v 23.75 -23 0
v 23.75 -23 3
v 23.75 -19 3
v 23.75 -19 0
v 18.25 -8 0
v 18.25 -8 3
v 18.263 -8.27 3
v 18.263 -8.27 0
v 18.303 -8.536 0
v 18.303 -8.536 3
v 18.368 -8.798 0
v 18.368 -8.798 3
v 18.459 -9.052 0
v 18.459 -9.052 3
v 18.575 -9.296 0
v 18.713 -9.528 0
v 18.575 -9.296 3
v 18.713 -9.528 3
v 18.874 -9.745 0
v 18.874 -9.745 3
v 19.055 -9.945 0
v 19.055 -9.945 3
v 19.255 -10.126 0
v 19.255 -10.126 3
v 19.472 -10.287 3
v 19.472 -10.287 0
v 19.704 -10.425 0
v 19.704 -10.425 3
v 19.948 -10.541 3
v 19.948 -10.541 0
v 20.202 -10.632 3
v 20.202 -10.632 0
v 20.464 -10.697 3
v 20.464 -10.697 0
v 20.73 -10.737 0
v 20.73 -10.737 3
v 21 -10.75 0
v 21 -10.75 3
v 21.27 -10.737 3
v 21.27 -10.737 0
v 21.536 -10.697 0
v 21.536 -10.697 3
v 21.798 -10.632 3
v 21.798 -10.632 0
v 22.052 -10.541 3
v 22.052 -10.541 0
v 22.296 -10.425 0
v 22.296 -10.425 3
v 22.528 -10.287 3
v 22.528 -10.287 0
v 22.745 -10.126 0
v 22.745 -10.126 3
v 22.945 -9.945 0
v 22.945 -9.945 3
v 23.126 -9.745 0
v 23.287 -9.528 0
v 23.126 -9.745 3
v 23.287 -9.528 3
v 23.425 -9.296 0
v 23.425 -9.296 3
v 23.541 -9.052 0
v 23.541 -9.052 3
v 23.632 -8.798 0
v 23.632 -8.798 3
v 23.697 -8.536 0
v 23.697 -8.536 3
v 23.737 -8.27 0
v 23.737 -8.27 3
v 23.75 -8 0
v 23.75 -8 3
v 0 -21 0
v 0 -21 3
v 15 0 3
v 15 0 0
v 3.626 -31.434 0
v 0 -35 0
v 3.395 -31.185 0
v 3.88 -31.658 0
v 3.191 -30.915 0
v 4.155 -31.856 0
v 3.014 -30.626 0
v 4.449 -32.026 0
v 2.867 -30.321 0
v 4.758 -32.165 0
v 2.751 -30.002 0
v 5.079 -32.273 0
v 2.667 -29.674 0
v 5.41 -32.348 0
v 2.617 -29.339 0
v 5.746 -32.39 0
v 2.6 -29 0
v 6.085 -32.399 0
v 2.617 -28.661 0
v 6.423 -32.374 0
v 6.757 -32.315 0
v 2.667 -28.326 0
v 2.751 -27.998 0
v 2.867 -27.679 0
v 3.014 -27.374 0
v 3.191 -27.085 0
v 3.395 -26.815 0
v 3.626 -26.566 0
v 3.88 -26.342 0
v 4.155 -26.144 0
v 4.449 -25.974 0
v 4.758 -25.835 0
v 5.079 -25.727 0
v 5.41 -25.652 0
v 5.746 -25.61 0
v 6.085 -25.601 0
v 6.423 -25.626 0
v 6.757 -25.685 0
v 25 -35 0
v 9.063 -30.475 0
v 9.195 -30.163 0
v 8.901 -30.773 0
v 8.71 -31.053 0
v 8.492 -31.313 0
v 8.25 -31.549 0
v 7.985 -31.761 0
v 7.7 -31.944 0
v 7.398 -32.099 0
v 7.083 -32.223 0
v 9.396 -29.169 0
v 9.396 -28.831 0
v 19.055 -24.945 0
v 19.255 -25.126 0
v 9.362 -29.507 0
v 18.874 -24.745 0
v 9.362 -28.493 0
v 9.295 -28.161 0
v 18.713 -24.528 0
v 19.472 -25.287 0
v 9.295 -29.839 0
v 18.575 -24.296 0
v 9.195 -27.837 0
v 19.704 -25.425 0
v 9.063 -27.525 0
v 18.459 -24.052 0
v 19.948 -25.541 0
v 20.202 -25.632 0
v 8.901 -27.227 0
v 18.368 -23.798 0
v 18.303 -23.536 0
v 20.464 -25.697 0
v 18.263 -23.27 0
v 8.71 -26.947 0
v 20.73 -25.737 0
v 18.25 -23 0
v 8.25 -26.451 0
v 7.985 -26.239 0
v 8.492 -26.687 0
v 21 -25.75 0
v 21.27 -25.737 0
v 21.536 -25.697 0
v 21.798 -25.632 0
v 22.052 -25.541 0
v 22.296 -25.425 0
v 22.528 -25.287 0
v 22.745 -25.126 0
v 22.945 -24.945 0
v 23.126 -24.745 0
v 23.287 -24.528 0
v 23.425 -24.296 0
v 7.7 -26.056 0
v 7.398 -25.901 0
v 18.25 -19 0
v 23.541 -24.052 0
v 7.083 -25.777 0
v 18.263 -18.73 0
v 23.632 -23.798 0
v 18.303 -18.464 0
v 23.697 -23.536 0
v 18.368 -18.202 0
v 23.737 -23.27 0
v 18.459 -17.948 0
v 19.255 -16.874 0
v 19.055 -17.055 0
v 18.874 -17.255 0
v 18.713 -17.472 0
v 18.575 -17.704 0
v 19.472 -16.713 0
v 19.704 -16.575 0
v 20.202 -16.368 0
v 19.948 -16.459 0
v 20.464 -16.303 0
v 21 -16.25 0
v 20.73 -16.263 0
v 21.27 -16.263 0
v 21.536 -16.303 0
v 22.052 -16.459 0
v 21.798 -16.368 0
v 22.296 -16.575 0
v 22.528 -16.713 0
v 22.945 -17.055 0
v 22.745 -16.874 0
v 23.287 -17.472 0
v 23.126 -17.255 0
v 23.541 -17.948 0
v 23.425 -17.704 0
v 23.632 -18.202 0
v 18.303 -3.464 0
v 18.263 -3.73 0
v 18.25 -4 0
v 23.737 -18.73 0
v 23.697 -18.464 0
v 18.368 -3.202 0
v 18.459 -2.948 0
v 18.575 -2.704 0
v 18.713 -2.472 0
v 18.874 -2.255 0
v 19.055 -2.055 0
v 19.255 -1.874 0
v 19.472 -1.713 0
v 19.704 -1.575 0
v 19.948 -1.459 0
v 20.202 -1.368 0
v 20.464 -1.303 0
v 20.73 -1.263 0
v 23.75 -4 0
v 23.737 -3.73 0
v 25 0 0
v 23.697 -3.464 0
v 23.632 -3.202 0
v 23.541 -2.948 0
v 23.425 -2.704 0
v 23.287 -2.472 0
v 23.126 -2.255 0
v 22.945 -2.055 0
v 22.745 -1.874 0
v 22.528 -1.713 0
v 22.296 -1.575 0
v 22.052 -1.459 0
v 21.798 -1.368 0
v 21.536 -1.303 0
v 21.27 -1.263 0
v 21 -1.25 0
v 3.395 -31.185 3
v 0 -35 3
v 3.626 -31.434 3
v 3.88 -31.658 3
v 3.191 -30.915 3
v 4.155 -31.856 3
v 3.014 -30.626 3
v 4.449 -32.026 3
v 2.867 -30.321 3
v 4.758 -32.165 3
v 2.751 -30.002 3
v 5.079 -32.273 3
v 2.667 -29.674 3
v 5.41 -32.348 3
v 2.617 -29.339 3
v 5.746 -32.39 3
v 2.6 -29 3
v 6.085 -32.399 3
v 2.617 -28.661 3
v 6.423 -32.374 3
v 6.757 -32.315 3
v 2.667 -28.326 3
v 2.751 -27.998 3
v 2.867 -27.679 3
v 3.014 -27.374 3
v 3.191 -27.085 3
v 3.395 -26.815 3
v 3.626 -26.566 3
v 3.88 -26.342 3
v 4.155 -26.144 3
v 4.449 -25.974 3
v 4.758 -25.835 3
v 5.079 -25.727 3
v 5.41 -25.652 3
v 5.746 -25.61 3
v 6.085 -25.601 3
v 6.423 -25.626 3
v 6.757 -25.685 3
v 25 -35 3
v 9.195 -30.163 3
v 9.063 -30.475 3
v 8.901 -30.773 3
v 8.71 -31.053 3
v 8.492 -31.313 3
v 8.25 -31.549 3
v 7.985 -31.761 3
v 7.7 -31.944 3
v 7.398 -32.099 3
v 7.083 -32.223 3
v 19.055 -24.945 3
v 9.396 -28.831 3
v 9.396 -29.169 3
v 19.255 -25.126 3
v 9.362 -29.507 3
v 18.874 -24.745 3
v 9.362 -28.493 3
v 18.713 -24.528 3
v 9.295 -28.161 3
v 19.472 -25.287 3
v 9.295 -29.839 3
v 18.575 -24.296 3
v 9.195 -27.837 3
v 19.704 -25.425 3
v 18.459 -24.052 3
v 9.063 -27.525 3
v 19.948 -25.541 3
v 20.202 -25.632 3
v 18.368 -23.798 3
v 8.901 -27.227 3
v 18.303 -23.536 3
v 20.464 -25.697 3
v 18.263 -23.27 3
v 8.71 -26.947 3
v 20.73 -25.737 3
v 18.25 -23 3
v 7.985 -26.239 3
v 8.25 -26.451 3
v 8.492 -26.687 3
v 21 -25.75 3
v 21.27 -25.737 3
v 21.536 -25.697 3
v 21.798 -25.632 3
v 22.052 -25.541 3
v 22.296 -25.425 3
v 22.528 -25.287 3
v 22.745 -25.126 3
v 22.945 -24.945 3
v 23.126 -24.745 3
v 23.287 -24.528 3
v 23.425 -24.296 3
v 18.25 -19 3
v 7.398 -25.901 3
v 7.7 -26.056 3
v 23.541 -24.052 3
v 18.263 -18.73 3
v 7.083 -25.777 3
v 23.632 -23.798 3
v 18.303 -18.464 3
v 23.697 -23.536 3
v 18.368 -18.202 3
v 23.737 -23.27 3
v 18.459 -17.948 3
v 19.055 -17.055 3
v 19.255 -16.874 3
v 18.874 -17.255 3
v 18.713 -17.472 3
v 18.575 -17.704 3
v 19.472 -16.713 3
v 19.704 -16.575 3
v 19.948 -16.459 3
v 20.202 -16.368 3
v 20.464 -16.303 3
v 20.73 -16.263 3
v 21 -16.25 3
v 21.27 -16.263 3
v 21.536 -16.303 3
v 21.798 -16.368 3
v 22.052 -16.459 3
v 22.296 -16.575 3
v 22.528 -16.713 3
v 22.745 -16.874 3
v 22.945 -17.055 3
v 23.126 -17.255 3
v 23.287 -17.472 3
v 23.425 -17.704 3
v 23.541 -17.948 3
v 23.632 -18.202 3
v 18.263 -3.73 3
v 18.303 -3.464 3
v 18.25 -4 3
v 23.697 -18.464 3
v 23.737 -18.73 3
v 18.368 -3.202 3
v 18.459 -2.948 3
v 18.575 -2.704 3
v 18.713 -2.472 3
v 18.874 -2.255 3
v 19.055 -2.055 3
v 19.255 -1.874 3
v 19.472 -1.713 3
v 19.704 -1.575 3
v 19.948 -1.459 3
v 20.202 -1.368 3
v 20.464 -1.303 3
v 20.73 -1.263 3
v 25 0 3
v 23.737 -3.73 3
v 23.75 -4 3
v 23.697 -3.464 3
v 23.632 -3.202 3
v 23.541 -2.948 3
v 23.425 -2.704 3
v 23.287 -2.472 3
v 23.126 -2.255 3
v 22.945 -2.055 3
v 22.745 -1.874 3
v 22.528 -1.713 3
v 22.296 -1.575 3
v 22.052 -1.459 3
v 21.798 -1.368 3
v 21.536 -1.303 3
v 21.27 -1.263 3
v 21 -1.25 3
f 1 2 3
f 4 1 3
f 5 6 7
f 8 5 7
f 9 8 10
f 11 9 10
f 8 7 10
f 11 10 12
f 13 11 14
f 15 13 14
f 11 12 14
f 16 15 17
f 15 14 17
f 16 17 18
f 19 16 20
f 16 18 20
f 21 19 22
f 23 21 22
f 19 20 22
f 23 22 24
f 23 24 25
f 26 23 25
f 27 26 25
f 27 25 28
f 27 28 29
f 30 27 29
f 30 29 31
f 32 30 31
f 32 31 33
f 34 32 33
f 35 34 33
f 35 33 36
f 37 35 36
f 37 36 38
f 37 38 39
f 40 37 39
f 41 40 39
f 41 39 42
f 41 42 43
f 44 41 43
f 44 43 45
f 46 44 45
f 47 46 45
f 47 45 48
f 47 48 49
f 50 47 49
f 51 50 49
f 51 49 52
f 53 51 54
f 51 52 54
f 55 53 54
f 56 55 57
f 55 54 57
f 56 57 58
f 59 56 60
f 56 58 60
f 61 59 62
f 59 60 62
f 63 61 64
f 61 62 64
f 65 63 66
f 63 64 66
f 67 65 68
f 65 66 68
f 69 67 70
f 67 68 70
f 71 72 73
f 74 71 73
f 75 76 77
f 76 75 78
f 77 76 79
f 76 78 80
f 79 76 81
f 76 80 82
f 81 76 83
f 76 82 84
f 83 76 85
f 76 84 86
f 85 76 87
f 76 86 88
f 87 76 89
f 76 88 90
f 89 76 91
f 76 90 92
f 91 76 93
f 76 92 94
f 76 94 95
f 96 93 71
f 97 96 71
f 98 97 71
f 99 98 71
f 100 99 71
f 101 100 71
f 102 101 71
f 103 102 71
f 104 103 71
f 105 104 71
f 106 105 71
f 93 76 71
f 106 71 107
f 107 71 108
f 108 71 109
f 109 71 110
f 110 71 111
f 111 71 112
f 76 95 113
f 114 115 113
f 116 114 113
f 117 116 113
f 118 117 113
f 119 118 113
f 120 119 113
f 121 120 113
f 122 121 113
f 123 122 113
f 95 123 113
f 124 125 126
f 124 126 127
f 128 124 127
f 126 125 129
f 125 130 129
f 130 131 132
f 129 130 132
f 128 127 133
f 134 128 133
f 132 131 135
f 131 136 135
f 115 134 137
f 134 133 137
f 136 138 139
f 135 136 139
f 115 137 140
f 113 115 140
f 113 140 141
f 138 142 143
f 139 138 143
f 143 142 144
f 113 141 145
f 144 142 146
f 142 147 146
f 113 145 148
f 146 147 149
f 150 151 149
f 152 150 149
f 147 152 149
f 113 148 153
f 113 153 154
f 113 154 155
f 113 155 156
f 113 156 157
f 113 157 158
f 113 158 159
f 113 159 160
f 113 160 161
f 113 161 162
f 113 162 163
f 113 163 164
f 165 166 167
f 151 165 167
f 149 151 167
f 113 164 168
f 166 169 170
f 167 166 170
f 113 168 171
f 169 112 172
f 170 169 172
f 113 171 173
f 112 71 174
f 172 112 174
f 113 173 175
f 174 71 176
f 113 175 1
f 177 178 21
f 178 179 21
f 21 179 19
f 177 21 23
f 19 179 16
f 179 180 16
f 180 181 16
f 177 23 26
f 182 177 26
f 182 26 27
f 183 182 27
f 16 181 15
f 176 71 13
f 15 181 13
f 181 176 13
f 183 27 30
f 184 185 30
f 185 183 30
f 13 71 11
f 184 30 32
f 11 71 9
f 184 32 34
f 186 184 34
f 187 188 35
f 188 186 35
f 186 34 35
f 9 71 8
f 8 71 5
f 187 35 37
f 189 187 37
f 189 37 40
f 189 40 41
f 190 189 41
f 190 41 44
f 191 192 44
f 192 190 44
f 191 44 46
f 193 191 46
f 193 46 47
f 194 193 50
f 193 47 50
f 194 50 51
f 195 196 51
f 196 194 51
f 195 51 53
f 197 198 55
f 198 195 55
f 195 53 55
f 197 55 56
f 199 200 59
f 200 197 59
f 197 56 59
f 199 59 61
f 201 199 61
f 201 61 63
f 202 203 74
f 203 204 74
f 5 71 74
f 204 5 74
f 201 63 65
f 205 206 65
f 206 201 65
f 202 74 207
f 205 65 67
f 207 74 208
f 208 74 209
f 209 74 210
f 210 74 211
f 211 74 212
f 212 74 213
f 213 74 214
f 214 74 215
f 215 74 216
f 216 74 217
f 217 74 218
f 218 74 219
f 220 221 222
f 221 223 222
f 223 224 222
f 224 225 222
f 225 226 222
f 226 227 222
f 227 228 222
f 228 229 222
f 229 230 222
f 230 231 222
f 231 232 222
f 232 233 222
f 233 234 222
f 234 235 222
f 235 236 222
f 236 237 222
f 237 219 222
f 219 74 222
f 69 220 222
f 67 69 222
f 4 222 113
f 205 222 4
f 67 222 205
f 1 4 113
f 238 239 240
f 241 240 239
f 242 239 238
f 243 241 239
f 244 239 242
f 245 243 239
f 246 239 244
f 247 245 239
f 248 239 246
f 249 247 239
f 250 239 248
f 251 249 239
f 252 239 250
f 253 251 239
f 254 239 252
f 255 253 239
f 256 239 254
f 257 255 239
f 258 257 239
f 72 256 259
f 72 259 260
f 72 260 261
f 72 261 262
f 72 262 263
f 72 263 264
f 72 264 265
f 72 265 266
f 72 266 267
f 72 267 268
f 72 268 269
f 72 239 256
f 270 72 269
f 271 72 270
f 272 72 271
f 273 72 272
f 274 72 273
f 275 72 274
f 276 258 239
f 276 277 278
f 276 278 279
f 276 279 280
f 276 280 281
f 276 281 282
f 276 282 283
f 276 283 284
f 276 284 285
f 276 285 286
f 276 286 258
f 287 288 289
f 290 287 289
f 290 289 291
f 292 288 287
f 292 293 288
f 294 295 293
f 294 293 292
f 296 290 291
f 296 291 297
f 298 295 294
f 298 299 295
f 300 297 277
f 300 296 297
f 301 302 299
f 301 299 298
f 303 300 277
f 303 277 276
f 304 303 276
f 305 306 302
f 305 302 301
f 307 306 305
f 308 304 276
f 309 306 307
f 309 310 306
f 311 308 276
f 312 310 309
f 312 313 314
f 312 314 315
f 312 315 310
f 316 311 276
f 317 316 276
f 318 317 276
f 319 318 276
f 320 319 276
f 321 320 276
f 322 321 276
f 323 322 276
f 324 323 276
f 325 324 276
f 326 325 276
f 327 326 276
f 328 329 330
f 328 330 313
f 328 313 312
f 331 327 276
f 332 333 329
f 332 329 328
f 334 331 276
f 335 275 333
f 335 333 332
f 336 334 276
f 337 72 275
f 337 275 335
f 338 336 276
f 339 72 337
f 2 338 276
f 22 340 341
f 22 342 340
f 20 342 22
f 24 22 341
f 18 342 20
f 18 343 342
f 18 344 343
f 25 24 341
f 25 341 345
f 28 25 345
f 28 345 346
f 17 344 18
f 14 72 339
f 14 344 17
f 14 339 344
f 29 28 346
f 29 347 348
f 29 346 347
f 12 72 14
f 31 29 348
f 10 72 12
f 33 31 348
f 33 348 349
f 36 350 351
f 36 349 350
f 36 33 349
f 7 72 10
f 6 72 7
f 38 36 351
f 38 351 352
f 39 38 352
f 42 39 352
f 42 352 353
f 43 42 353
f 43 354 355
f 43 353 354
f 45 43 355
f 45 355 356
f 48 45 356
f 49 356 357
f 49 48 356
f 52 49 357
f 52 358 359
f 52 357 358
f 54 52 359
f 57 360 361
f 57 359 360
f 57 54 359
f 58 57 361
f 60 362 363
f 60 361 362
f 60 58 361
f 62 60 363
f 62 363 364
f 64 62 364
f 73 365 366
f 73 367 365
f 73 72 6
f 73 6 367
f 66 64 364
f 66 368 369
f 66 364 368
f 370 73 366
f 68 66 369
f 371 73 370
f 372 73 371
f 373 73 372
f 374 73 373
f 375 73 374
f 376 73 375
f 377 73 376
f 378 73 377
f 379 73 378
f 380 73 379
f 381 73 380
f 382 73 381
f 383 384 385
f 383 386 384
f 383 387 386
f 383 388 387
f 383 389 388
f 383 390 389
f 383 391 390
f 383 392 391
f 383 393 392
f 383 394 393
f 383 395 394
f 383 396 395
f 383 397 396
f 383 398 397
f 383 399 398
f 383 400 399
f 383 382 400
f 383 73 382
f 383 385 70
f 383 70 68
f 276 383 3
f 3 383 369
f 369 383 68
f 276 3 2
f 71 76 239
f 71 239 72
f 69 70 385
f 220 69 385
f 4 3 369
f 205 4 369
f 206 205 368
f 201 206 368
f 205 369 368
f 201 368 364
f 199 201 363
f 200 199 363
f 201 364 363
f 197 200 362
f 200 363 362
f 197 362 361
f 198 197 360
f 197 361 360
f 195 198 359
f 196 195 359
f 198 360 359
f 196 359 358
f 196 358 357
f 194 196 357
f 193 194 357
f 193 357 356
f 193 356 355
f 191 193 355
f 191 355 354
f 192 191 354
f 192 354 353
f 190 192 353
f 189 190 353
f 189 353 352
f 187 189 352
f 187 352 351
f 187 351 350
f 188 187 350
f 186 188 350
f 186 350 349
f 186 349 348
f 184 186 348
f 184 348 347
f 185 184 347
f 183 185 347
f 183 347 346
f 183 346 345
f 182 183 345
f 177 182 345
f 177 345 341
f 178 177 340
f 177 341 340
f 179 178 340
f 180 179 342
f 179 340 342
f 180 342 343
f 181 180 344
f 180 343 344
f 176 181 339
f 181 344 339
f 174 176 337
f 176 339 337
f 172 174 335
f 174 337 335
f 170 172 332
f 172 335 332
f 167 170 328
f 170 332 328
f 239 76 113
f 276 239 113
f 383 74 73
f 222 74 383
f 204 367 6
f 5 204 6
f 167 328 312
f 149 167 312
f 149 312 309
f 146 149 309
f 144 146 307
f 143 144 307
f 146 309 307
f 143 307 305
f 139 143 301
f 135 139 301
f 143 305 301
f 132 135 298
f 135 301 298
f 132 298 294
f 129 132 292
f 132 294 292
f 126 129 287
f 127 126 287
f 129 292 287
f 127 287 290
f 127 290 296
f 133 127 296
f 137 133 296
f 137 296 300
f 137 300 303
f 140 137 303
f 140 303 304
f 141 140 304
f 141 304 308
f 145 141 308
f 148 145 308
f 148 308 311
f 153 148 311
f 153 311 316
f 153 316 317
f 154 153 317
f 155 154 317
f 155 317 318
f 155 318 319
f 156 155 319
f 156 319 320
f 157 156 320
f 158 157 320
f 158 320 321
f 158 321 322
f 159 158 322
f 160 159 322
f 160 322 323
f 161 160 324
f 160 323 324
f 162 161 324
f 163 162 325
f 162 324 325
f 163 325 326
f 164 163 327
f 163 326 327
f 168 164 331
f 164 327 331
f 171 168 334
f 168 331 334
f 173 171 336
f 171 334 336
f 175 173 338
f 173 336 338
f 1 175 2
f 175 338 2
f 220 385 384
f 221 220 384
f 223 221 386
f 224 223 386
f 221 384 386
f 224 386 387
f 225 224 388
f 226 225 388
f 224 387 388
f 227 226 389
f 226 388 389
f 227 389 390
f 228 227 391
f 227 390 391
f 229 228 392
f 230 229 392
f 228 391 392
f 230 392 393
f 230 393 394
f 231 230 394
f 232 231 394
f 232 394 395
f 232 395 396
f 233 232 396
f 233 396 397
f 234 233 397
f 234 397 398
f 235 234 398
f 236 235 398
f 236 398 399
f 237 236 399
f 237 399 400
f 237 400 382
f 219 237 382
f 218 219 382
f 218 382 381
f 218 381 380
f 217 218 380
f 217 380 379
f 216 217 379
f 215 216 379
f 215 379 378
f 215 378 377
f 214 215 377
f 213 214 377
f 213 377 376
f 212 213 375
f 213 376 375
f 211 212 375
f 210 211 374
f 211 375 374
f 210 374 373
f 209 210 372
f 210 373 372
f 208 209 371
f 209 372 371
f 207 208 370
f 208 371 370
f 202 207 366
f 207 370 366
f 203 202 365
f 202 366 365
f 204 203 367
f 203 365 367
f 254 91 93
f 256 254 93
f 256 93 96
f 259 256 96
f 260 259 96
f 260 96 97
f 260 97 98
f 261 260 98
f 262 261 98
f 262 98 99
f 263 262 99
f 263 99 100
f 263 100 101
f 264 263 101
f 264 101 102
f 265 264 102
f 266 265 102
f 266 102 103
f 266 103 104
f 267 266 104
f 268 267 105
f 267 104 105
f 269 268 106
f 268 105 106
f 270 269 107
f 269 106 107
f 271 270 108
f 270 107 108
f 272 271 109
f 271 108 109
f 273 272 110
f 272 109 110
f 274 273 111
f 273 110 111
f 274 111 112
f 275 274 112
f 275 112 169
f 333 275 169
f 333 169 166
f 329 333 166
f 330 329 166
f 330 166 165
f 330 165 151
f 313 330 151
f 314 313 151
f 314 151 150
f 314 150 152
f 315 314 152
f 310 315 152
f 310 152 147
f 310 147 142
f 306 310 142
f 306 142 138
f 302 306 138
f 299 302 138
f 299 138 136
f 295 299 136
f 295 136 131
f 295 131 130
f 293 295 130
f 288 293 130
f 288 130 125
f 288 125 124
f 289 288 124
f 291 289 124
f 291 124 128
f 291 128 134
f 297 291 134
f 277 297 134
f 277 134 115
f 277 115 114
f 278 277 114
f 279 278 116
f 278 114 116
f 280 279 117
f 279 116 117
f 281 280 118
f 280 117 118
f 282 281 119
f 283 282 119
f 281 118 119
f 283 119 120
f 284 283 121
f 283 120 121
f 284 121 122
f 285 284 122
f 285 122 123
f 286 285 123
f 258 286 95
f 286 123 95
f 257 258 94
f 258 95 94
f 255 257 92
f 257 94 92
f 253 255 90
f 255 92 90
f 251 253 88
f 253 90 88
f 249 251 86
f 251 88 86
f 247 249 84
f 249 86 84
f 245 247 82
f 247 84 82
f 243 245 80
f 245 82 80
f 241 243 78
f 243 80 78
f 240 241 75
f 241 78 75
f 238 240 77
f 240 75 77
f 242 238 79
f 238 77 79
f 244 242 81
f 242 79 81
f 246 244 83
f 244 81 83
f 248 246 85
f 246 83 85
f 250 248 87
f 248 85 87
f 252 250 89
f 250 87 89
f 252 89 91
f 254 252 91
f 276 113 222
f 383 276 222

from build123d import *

# Parameters (mm, degrees)
F0_W     = 25
F0_H     = 35
F1_DEPTH = 3
F3_DEPTH = 25
F4_D     = 6.8
F4_DEPTH = 16.35
F4_TIP   = 2.0429261047
F6_DEPTH = 25


with BuildPart() as f1:
    # F0 (on Top) → F1 (new body)
    with BuildSketch(Plane.XY):
        with Locations((12.5, -17.5)):
            Rectangle(F0_W, F0_H)
    extrude(amount=F1_DEPTH)

    # F2 (on face) → F3 (cut)
    with BuildSketch(Plane.XY.offset(3)):
        with BuildLine():
            Line((18.25, -4), (23.75, -4))
            ThreePointArc((23.75, -4), (21, -1.25), (18.25, -4))
        make_face()
        with BuildLine():
            Line((23.75, -8), (23.75, -4))
            ThreePointArc((23.75, -4), (23.5251743677, -5.089033706), (22.8874586088, -6))
            ThreePointArc((22.8874586088, -6), (23.5251743677, -6.910966294), (23.75, -8))
        make_face()
        with BuildLine():
            ThreePointArc((22.8874586088, -6), (23.5251743677, -5.089033706), (23.75, -4))
            Line((23.75, -4), (18.25, -4))
            ThreePointArc((18.25, -4), (18.4748256323, -5.089033706), (19.1125413912, -6))
            ThreePointArc((19.1125413912, -6), (21, -5.25), (22.8874586088, -6))
        make_face()
        with BuildLine():
            ThreePointArc((19.1125413912, -6), (18.4748256323, -5.089033706), (18.25, -4))
            Line((18.25, -4), (18.25, -8))
            ThreePointArc((18.25, -8), (18.4748256323, -6.910966294), (19.1125413912, -6))
        make_face()
        with BuildLine():
            ThreePointArc((23.75, -8), (23.5251743677, -6.910966294), (22.8874586088, -6))
            ThreePointArc((22.8874586088, -6), (21, -6.75), (19.1125413912, -6))
            ThreePointArc((19.1125413912, -6), (18.4748256323, -6.910966294), (18.25, -8))
            ThreePointArc((18.25, -8), (21, -10.75), (23.75, -8))
        make_face()
        with BuildLine():
            ThreePointArc((22.8874586088, -21), (23.5251743677, -20.089033706), (23.75, -19))
            ThreePointArc((23.75, -19), (21, -16.25), (18.25, -19))
            ThreePointArc((18.25, -19), (18.4748256323, -20.089033706), (19.1125413912, -21))
            ThreePointArc((19.1125413912, -21), (21, -20.25), (22.8874586088, -21))
        make_face()
        with BuildLine():
            Line((23.75, -23), (23.75, -19))
            ThreePointArc((23.75, -19), (23.5251743677, -20.089033706), (22.8874586088, -21))
            ThreePointArc((22.8874586088, -21), (23.5251743677, -21.910966294), (23.75, -23))
        make_face()
        with BuildLine():
            ThreePointArc((19.1125413912, -21), (18.4748256323, -20.089033706), (18.25, -19))
            Line((18.25, -19), (18.25, -23))
            ThreePointArc((18.25, -23), (18.4748256323, -21.910966294), (19.1125413912, -21))
        make_face()
        with BuildLine():
            ThreePointArc((23.75, -23), (23.5251743677, -21.910966294), (22.8874586088, -21))
            ThreePointArc((22.8874586088, -21), (21, -21.75), (19.1125413912, -21))
            ThreePointArc((19.1125413912, -21), (18.4748256323, -21.910966294), (18.25, -23))
            ThreePointArc((18.25, -23), (21, -25.75), (23.75, -23))
        make_face()
        with BuildLine():
            ThreePointArc((19.1125413912, -21), (21, -21.75), (22.8874586088, -21))
            ThreePointArc((22.8874586088, -21), (21, -20.25), (19.1125413912, -21))
        make_face()
        with BuildLine():
            ThreePointArc((19.1125413912, -6), (21, -6.75), (22.8874586088, -6))
            ThreePointArc((22.8874586088, -6), (21, -5.25), (19.1125413912, -6))
        make_face()
    extrude(amount=-F3_DEPTH, mode=Mode.SUBTRACT)

    # F4
    with Locations(Plane.XY.offset(3)):
        with Locations((6, -29)):
            Hole(F4_D / 2, depth=F4_DEPTH)
            with Locations((0, 0, -(F4_DEPTH + F4_TIP / 2))):  # 118° drill point
                Cone(0, F4_D / 2, F4_TIP, mode=Mode.SUBTRACT)

    # F5 (on face) → F6 (cut)
    with BuildSketch(Plane.XY.offset(3)):
        Polygon((0, -21), (15, 0), (0, 0), align=None)
    extrude(amount=-F6_DEPTH, mode=Mode.SUBTRACT)


solid = f1.part
